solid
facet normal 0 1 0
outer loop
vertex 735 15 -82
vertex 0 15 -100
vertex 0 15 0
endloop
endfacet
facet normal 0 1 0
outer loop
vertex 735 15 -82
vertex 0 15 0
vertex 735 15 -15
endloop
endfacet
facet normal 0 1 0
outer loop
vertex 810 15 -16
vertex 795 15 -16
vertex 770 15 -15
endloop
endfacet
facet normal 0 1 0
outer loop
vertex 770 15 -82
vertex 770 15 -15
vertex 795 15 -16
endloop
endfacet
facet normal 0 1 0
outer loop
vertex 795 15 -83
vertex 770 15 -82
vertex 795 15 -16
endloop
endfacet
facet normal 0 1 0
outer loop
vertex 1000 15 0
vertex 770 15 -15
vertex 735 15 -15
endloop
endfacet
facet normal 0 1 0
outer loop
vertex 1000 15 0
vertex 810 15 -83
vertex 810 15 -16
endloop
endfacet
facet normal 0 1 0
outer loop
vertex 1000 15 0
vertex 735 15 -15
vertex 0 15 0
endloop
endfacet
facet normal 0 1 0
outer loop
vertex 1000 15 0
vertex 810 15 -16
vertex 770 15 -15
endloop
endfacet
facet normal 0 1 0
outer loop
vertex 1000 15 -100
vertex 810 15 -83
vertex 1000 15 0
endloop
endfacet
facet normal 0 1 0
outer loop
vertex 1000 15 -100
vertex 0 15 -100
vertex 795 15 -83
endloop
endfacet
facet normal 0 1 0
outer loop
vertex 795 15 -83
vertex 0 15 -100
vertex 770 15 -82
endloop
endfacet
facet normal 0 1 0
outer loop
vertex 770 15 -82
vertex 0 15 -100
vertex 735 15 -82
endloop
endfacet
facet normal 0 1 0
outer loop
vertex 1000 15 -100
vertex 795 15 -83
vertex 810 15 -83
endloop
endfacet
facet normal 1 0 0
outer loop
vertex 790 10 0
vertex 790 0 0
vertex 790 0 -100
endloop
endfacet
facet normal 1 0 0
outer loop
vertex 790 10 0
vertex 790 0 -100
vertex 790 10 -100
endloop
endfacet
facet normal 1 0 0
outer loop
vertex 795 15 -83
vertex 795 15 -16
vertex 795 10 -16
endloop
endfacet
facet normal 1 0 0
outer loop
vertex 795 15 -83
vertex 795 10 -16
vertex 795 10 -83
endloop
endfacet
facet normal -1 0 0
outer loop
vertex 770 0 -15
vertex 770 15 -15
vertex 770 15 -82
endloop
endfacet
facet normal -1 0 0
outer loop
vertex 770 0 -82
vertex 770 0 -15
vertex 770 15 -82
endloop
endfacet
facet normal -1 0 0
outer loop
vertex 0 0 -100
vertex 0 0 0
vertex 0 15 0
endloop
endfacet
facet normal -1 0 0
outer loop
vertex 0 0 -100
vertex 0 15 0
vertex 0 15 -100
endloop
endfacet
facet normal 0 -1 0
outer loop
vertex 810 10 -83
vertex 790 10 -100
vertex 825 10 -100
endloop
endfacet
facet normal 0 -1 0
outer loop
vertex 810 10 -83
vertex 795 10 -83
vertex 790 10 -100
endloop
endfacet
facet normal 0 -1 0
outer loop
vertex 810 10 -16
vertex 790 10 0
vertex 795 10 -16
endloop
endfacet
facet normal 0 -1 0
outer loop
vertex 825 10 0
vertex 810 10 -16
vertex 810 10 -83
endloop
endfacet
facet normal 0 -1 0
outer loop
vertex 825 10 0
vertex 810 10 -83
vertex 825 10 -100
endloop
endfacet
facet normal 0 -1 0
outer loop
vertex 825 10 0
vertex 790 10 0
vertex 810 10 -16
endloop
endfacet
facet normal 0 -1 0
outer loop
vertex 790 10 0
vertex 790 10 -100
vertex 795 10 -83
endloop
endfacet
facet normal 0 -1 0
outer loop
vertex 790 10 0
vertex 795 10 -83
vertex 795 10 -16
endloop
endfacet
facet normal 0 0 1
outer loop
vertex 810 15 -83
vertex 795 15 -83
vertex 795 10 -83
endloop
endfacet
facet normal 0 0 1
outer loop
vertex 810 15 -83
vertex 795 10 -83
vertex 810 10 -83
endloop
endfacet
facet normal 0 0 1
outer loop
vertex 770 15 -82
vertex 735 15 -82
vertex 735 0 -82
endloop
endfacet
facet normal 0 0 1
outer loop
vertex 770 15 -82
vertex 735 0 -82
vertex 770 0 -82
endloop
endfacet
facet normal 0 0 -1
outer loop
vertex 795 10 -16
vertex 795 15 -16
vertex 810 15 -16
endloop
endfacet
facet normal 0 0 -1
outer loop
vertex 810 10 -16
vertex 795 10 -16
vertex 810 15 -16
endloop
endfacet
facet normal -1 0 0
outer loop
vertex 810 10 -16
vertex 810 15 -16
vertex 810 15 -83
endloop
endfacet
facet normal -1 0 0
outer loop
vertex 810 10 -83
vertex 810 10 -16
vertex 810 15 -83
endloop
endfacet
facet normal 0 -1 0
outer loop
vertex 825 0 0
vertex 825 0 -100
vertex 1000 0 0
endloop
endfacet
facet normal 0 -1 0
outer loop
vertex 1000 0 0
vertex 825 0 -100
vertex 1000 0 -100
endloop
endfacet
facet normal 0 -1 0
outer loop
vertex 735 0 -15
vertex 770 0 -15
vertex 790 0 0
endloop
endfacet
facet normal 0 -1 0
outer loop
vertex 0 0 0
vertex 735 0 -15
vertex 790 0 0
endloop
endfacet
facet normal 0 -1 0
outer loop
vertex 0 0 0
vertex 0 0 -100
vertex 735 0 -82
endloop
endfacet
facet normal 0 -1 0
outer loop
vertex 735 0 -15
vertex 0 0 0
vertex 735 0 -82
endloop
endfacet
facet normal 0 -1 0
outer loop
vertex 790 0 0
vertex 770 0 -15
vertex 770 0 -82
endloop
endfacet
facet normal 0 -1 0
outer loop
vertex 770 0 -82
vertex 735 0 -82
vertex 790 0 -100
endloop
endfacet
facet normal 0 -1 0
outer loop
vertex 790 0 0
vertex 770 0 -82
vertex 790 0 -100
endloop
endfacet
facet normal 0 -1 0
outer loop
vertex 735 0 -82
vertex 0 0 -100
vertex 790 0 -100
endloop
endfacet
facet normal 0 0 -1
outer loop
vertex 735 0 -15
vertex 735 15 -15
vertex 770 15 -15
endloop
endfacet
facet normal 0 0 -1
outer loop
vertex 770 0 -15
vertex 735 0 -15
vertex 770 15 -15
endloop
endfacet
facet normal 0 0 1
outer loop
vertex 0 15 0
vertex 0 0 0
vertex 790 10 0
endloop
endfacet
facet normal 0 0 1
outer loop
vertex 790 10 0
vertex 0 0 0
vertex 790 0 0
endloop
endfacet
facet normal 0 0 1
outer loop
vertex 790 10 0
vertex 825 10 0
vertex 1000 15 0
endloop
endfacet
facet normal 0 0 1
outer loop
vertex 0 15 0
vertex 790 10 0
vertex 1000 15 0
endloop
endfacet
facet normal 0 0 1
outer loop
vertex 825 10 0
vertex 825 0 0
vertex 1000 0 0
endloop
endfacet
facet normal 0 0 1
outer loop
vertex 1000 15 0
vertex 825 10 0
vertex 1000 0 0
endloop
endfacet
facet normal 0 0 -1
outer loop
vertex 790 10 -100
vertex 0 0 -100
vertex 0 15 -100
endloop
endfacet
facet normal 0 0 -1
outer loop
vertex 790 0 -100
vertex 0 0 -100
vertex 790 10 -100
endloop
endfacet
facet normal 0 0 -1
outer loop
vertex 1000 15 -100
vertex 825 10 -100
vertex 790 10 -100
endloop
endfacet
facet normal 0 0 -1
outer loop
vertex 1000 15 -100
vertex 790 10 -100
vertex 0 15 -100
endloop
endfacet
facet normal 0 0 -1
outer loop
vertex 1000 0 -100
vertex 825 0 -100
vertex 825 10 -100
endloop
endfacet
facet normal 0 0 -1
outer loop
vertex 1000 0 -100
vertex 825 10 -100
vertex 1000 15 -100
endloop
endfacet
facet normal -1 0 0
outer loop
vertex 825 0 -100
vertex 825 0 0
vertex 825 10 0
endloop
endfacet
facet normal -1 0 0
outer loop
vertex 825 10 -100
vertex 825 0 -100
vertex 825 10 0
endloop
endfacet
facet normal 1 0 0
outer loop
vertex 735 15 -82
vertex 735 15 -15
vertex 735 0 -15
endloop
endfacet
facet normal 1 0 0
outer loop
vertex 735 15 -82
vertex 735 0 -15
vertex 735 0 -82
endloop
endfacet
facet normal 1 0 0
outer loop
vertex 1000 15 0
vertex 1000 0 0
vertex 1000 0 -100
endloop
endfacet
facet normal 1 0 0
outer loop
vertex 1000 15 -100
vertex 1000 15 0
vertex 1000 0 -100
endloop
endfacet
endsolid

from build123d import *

# Parameters (mm, degrees)
SKETCH1_W           = 1000
SKETCH1_H           = 100
BOSS_EXTRUDE1_DEPTH = 15
SKETCH2_W           = 35
SKETCH2_H           = 67
CUT_EXTRUDE1_DEPTH  = 15
SKETCH4_W           = 35
SKETCH4_H           = 10
CUT_EXTRUDE2_DEPTH  = 100
SKETCH5_W           = 15
SKETCH5_H           = 67
CUT_EXTRUDE4_DEPTH  = 100


with BuildPart() as part:
    # Sketch1 → Boss-Extrude1 (new body)
    with BuildSketch(Plane(origin=(0, 0, 0), x_dir=(1, 0, 0), z_dir=(0, 1, 0))):
        with Locations((500, 50)):
            Rectangle(SKETCH1_W, SKETCH1_H)
    extrude(amount=BOSS_EXTRUDE1_DEPTH)

    # Sketch2 → Cut-Extrude1 (cut)
    with BuildSketch(Plane(origin=(0, 15, 0), x_dir=(1, 0, 0), z_dir=(0, 1, 0))):
        with Locations((752.5, 48.5)):
            Rectangle(SKETCH2_W, SKETCH2_H)
    extrude(amount=-CUT_EXTRUDE1_DEPTH, mode=Mode.SUBTRACT)

    # Sketch4 → Cut-Extrude2 (cut)
    with BuildSketch(Plane.XY):
        with Locations((807.5, 5)):
            Rectangle(SKETCH4_W, SKETCH4_H)
    extrude(amount=-CUT_EXTRUDE2_DEPTH, mode=Mode.SUBTRACT)

    # Sketch5 → Cut-Extrude4 (cut)
    with BuildSketch(Plane(origin=(0, 15, 0), x_dir=(1, 0, 0), z_dir=(0, 1, 0))):
        with Locations((802.5, 49.5)):
            Rectangle(SKETCH5_W, SKETCH5_H)
    extrude(amount=-CUT_EXTRUDE4_DEPTH, mode=Mode.SUBTRACT)


solid = part.part
